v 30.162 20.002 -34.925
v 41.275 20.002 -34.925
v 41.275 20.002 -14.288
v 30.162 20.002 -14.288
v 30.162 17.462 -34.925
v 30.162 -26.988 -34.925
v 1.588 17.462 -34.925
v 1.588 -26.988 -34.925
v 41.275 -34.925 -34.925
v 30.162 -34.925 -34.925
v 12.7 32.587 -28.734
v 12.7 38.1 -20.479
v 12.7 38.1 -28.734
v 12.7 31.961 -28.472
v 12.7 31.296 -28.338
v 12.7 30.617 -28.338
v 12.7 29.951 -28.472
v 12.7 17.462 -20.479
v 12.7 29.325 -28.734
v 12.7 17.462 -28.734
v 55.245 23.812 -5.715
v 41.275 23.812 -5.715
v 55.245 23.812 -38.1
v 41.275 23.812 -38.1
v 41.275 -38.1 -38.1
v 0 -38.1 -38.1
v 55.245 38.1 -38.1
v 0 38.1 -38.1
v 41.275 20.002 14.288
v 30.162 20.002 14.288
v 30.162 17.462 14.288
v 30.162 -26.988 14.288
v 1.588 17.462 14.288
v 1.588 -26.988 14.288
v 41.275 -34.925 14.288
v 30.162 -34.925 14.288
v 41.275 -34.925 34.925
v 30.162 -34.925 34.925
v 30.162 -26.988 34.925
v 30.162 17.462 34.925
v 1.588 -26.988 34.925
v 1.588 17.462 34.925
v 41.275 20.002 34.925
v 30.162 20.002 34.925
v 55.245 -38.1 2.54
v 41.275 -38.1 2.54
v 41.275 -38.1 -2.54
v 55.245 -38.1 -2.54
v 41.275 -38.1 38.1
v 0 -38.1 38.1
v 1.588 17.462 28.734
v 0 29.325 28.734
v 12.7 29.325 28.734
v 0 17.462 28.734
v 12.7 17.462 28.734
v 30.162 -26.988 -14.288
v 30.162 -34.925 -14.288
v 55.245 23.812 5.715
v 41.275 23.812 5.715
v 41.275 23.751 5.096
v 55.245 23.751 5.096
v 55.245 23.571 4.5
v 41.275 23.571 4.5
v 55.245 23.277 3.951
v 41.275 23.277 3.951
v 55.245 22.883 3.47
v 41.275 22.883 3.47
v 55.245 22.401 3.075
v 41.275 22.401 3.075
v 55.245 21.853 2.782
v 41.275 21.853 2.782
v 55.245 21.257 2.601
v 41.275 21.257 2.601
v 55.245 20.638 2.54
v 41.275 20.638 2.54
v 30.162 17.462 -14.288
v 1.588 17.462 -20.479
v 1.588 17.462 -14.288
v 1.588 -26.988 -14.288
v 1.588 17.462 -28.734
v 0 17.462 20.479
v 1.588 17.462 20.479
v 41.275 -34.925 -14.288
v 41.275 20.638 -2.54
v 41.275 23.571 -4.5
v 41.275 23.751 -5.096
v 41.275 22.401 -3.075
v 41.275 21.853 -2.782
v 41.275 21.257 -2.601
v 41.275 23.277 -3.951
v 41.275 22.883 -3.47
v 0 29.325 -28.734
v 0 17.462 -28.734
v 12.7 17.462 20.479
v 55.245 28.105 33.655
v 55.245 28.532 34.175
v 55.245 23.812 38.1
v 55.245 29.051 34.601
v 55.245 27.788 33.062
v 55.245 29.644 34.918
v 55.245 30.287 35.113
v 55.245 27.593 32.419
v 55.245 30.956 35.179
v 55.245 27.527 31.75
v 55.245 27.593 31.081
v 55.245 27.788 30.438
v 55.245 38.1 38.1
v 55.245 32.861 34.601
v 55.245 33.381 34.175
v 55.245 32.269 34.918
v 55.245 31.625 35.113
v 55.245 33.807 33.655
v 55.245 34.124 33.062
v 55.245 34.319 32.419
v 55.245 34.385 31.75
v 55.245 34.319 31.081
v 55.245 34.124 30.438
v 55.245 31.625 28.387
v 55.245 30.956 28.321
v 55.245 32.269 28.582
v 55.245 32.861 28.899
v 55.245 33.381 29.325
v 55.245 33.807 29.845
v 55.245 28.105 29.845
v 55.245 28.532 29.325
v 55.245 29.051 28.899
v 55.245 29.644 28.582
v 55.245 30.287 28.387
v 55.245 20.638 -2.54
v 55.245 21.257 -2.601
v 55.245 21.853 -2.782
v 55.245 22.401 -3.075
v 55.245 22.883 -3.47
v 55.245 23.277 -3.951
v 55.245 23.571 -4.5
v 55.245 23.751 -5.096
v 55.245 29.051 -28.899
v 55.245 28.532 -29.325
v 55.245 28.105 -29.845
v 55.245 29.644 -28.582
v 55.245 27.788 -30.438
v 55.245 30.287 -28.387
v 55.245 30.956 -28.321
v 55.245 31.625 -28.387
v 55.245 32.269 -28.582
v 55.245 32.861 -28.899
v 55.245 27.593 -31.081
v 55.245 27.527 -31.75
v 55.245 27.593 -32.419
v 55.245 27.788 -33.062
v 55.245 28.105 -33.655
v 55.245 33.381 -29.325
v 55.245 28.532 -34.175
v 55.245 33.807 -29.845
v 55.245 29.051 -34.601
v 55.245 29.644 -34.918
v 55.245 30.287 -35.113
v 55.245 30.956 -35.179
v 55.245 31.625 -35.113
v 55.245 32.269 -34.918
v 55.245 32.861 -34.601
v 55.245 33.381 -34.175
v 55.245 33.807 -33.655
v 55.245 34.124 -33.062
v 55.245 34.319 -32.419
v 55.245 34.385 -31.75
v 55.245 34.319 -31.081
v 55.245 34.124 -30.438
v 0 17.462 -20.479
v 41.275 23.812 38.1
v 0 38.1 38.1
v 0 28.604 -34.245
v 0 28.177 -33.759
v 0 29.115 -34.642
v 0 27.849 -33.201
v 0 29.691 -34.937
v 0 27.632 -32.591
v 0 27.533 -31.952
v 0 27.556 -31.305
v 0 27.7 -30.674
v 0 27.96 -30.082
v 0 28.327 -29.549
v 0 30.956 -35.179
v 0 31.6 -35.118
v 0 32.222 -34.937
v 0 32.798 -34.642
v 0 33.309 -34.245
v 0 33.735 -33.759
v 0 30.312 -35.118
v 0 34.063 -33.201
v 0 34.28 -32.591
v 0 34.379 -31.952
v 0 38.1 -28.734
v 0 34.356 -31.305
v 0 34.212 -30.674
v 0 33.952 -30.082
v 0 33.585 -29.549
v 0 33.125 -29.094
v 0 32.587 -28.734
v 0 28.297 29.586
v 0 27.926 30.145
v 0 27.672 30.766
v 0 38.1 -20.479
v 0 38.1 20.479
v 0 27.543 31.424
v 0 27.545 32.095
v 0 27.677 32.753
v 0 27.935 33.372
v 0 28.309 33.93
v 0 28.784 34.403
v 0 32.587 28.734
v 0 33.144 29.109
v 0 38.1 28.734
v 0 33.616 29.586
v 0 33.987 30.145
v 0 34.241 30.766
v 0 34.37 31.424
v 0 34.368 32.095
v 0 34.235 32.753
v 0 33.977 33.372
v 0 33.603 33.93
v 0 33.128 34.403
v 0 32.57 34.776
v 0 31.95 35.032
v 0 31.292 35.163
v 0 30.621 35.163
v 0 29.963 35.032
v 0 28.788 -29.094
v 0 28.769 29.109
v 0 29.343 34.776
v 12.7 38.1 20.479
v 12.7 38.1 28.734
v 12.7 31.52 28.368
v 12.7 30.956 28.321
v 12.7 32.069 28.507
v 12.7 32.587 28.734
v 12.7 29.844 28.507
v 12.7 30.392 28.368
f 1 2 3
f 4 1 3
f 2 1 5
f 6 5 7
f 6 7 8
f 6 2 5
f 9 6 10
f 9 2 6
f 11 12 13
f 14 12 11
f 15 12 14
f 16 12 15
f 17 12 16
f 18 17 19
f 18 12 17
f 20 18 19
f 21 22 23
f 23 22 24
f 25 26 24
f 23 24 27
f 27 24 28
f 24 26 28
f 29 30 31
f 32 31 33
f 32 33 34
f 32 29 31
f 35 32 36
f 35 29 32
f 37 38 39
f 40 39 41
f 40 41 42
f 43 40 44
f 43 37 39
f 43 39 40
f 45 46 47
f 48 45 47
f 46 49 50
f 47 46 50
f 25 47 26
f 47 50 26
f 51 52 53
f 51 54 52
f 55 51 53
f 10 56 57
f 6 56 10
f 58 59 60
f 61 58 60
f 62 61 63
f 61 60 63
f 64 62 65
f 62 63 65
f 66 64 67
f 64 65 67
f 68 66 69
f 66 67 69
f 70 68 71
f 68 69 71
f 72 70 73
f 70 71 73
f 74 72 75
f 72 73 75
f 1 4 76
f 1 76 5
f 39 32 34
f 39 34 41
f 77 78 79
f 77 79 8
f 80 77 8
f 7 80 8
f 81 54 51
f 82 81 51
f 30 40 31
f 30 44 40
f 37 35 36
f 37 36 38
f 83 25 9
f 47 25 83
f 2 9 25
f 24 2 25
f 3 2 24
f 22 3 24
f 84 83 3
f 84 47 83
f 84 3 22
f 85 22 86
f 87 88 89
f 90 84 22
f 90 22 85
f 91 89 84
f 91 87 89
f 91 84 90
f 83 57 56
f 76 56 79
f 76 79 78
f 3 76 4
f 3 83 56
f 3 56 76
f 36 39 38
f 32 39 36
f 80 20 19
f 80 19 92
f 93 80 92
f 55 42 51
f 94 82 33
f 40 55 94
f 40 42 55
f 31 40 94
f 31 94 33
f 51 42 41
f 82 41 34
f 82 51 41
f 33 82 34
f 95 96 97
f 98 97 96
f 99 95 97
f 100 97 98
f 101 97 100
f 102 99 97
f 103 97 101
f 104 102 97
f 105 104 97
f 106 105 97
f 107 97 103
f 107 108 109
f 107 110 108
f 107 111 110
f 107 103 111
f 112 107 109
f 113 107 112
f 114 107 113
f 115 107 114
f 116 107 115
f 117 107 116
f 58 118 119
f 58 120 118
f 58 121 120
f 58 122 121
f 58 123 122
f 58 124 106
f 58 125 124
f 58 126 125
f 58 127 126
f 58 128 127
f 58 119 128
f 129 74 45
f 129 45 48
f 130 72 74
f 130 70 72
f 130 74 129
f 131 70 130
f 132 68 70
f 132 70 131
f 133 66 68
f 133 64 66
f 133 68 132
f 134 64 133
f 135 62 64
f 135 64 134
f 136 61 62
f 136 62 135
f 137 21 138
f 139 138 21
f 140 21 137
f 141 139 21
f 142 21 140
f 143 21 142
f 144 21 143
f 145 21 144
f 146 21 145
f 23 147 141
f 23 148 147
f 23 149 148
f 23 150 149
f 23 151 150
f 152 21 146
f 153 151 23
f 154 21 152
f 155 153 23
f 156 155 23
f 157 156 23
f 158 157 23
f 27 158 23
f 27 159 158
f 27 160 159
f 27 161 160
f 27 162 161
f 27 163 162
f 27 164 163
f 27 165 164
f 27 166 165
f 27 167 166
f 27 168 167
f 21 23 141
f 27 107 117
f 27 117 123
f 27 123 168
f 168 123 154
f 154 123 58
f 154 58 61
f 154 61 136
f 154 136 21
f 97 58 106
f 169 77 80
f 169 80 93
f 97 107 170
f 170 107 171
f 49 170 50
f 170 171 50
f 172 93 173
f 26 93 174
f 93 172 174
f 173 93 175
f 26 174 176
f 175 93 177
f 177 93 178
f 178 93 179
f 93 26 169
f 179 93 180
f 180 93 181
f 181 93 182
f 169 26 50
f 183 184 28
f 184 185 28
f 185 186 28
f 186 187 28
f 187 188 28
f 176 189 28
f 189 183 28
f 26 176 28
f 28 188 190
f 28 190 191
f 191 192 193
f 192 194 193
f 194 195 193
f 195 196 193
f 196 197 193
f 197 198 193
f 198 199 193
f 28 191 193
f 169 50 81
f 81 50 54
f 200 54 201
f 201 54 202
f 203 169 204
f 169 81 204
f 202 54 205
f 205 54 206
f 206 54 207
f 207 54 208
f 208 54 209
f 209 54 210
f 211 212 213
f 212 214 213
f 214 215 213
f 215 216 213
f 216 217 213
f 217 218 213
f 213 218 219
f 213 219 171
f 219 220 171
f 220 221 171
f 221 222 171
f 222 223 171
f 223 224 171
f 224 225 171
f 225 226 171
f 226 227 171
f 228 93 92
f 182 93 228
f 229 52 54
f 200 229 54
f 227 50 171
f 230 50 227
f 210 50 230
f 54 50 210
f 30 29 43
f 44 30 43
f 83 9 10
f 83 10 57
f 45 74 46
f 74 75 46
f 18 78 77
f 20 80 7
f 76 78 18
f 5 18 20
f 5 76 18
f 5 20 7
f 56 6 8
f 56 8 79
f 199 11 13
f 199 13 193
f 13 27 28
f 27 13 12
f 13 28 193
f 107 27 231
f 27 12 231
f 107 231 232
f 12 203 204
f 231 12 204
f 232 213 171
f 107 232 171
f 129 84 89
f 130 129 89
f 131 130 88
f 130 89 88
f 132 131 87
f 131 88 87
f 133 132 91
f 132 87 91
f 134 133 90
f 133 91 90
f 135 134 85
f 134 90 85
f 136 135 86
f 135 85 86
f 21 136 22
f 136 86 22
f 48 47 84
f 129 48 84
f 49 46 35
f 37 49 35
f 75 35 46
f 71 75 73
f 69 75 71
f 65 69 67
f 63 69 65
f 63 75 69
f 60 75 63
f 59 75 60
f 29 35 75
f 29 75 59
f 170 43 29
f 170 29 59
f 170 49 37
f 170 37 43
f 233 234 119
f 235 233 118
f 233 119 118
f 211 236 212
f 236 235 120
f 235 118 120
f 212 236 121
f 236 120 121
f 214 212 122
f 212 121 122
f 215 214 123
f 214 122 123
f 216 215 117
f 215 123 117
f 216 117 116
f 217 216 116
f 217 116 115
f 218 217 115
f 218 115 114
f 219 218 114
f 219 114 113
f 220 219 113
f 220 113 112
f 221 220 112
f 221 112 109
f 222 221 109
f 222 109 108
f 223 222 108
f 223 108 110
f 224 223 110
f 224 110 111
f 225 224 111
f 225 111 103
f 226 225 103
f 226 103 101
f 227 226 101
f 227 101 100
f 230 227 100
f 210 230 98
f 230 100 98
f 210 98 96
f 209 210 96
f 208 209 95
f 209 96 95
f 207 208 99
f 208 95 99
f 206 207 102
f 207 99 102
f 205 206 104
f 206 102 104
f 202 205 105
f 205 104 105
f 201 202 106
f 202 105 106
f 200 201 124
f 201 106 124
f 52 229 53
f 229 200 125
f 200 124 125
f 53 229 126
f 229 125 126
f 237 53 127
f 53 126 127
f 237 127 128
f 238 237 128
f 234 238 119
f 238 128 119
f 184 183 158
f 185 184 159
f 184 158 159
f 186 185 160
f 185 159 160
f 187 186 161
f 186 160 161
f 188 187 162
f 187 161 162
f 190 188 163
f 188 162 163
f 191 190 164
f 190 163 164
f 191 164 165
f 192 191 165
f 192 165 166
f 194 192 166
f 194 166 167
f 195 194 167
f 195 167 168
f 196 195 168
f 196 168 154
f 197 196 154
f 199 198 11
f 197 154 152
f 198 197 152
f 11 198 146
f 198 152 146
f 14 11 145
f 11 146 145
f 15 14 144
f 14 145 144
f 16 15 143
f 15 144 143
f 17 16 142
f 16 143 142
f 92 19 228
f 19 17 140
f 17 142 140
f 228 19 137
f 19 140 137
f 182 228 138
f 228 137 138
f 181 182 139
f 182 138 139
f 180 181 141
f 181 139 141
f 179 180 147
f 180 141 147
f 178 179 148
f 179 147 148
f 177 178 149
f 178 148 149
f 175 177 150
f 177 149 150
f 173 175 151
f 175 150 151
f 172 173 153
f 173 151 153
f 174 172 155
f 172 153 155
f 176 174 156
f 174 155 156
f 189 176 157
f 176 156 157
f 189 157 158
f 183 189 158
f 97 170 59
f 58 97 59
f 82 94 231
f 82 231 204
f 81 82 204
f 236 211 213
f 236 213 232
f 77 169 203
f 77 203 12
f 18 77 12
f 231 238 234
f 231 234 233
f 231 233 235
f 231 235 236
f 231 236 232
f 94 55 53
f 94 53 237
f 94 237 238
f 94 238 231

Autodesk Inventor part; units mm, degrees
ref_plane "YZ Plane" through (0, 0, 0) normal (1, 0, 0) x (0, 1, 0)
ref_plane "XZ Plane" through (0, 0, 0) normal (0, 1, 0) x (-1, 0, 0)
ref_plane "XY Plane" through (0, 0, 0) normal (0, 0, 1) x (1, 0, 0)
sketch "Sketch1" plane through (0, 0, 0) normal (1, 0, 0) x (0, 1, 0)
  line L0 (38.1, 38.1) -> (-38.1, 38.1)
  line L1 (-38.1, 38.1) -> (-38.1, -38.1)
  line L2 (-38.1, -38.1) -> (38.1, -38.1)
  line L3 (38.1, -38.1) -> (38.1, 38.1)
  point P0 (0, 0)
  dimension "d0" = 76.2
  dimension "d1" = 76.2
  dimension "d2" = 38.1
  dimension "d3" = 38.1
extrude "Extrusion1" add sketch "Sketch1" along normal blind 41.275
sketch "Sketch2" plane through (41.275, 0, 0) normal (1, 0, 0) x (0, 0, -1)
  line L0 (-38.1, -38.1) -> (38.1, -38.1) projected
  line L1 (38.1, -38.1) -> (38.1, 38.1) projected
  line L2 (38.1, 38.1) -> (-38.1, 38.1) projected
  line L3 (-38.1, 38.1) -> (-38.1, -38.1) projected
  line L4 (-34.925, 17.4625) -> (-14.2875, 17.4625)
  line L5 (-14.2875, 17.4625) -> (-14.2875, -26.9875)
  line L6 (-14.2875, -26.9875) -> (-34.925, -26.9875)
  line L7 (-34.925, -26.9875) -> (-34.925, 17.4625)
  dimension "d64" = 20.6375
  dimension "d65" = 44.45
  dimension "d66" = 3.175
  dimension "d67" = 11.1125
extrude "Extrusion2" cut sketch "Sketch2" against normal blind 39.6875 contours L4 L5 L6 L7
sketch "Sketch3" plane through (41.275, 0, 0) normal (1, 0, 0) x (0, 0, -1)
  line L0 (-14.2875, 17.4625) -> (-14.2875, -26.9875) projected
  line L1 (-14.2875, -26.9875) -> (-34.925, -26.9875) projected
  line L2 (-34.925, -26.9875) -> (-34.925, 17.4625) projected
  line L3 (-34.925, 17.4625) -> (-14.2875, 17.4625) projected
  line L4 (-38.1, -38.1) -> (38.1, -38.1) projected
  line L5 (38.1, -38.1) -> (38.1, 38.1) projected
  line L6 (38.1, 38.1) -> (-38.1, 38.1) projected
  line L7 (-38.1, 38.1) -> (-38.1, -38.1) projected
  line L8 (-14.2875, -26.9875) -> (-34.925, -26.9875) projected
  line L9 (-34.925, -26.9875) -> (-14.2875, -26.9875)
  line L10 (-14.2875, -26.9875) -> (-14.2875, -34.925)
  line L11 (-14.2875, -34.925) -> (-34.925, -34.925)
  line L12 (-34.925, -34.925) -> (-34.925, -26.9875)
  line L13 (-34.925, 17.4625) -> (-14.2875, 17.4625)
  line L14 (-14.2875, 17.4625) -> (-14.2875, 20.0025)
  line L15 (-14.2875, 20.0025) -> (-34.925, 20.0025)
  line L16 (-34.925, 20.0025) -> (-34.925, 17.4625)
  dimension "d68" = 7.9375
  dimension "d69" = 20.6375
  dimension "d70" = 20.6375
  dimension "d71" = 20.6375
  dimension "d72" = 2.54
extrude "Extrusion3" cut sketch "Sketch3" against normal blind 11.1125 contours L3 L16 L15 L14 | L10 L11 L12 L1
sketch "Sketch4" plane through (15.875, 17.4625, 12.7) normal (0, -1, 0) x (1, 0, 0)
  line L0 (-15.875, -50.8) -> (-15.875, 25.4) projected
  line L1 (-15.875, 25.4) -> (25.4, 25.4) projected
  line L2 (25.4, -50.8) -> (25.4, 25.4) projected
  line L3 (-15.875, -50.8) -> (25.4, -50.8) projected
  line L4 (25.4, 22.225) -> (25.4, 1.5875) projected
  line L5 (25.4, 22.225) -> (14.2875, 22.225) projected
  line L6 (14.2875, 22.225) -> (14.2875, 1.5875) projected
  line L7 (25.4, 1.5875) -> (14.2875, 1.5875) projected
  line L8 (-15.875, 16.0338) -> (-3.175, 16.0338)
  line L9 (-3.175, 16.0338) -> (-3.175, 7.7788)
  line L10 (-3.175, 7.7788) -> (-15.875, 7.7788)
  line L11 (-15.875, 7.7788) -> (-15.875, 16.0338)
  point P0 (-3.175, 11.9063)
  dimension "d73" = 8.255
  dimension "d74" = 12.7
  dimension "d75" = 20.6375
  dimension "d76" = 10.3187
extrude "Extrusion4" cut sketch "Sketch4" against normal blind 38.1 contours L0 L8 L9 L10
mirror "Mirror1" about plane through (0, 0, 0) normal (0, 0, 1) of "Extrusion4", "Extrusion3", "Extrusion2"
sketch "Sketch5" plane through (41.275, 0, 0) normal (1, 0, 0) x (0, 0, -1)
  line L0 (-38.1, -38.1) -> (38.1, -38.1) projected
  line L1 (38.1, -38.1) -> (38.1, 38.1) projected
  line L2 (38.1, 38.1) -> (-38.1, 38.1) projected
  line L3 (-38.1, 38.1) -> (-38.1, -38.1) projected
  line L4 (-38.1, -38.1) -> (38.1, -38.1) projected
  line L5 (-2.54, -38.1) -> (2.54, -38.1)
  line L6 (2.54, -38.1) -> (2.54, 20.6375)
  line L7 (2.54, 23.8125) -> (-2.54, 23.8125)
  line L8 (-2.54, 20.6375) -> (-2.54, -38.1)
  line L9 (-38.1, 38.1) -> (-38.1, -38.1) projected
  line L10 (38.1, 38.1) -> (-38.1, 38.1)
  line L11 (-38.1, 38.1) -> (-38.1, 23.8125)
  line L12 (-38.1, 23.8125) -> (-5.715, 23.8125)
  line L13 (38.1, 23.8125) -> (38.1, 38.1)
  line L14 (5.715, 23.8125) -> (38.1, 23.8125)
  line L15 (2.54, 23.8125) -> (2.54, 23.8125)
  arc A0 (-2.54, 20.6375) -> (-5.715, 23.8125) centre (-5.715, 20.6375) ccw
  arc A1 (5.715, 23.8125) -> (2.54, 20.6375) centre (5.715, 20.6375) ccw
  line L16 (-14.2875, 20.0025) -> (-14.2875, -34.925) projected
  line L17 (-34.925, -34.925) -> (-34.925, 20.0025) projected
  line L18 (-14.2875, -34.925) -> (-34.925, -34.925) projected
  line L19 (-34.925, 20.0025) -> (-14.2875, 20.0025) projected
  point P0 (0, 0)
  point P1 (38.1, 23.8125)
  point P2 (-2.54, -38.1)
  dimension "d36" = 5.08
  dimension "d39" = 2.54
  dimension "d40" = 3.175
  dimension "d44" = 61.9125
extrude "Extrusion5" add sketch "Sketch5" along normal blind 13.97 contours L8 A0 L12 L3 L2 L1 L14 A1 L6 L0
sketch "Sketch6" plane through (0, -38.1, 38.1) normal (0, 0, 1) x (1, 0, 0)
  line L0 (-11.1125, 84.1375) -> (53.975, 84.1375)
  line L1 (53.975, 84.1375) -> (53.975, -9.525)
  line L2 (53.975, -9.525) -> (-11.1125, -9.525)
  line L3 (-11.1125, -9.525) -> (-11.1125, 84.1375)
  point P0 (0, 38.1)
extrude "Extrusion6" [suppressed]
sketch "Sketch7" plane through (3.175, 22.225, -11.2395) normal (0, 0, -1) x (-1, 0, 0)
  line L0 (3.175, 15.875) -> (3.175, -60.325) projected
  line L1 (-28.575, 0) -> (-12.7, 0) projected
  line L2 (3.175, 15.875) -> (3.175, -60.325) projected
  line L3 (3.175, -60.325) -> (-38.1, -60.325) projected
  line L4 (-38.1, 1.5875) -> (-38.1, -60.325) projected
  line L5 (-38.1, 1.5875) -> (-52.07, 1.5875) projected
  line L6 (-52.07, 15.875) -> (-52.07, 1.5875) projected
  line L7 (3.175, 15.875) -> (-52.07, 15.875) projected
  line L8 (3.175, 15.875) -> (-6.35, 15.875)
  line L9 (-6.35, 15.875) -> (-6.35, 0)
  line L10 (-6.35, 0) -> (3.175, 0)
  line L11 (3.175, 0) -> (3.175, 15.875)
  line L12 (-6.35, -1.5875) -> (-6.35, 15.875) projected
  line L13 (-6.35, 0) -> (3.175, 12.7)
  point P0 (3.175, -22.225)
  point P1 (3.175, 15.875)
  point P2 (-6.35, 15.875)
  dimension "d49" = 9.525
  dimension "d50" = 3.175
extrude "Extrusion7" [suppressed]
mirror "Mirror2" [suppressed]
sketch "Sketch8" plane through (0, 38.1, 38.1) normal (0, 1, 0) x (1, 0, 0)
  line L0 (9.525, 46.1645) -> (0, 46.1645) projected
  line L1 (0, 36.6395) -> (9.525, 36.6395) projected
  line L2 (15.875, 47.625) -> (15.875, 60.579) projected
  arc A0 (0, 36.6395) -> (0, 46.1645) centre (-0.8069, 41.402) ccw
  line L3 (0, 46.1645) -> (0, 36.6395)
  point P0 (0, 38.1)
  point P1 (3.175, 49.3395)
  point P2 (3.175, 58.8645)
  dimension "d53" = 4.8304
extrude "Extrusion8" [suppressed]
mirror "Mirror3" [suppressed]
sketch "Sketch11" plane through (55.245, 0, 0) normal (1, 0, 0) x (0, 0, -1)
  circle A0 centre (-31.75, 30.9563) radius 3.429
  circle A1 centre (31.75, 30.9563) radius 3.429
  line L0 (5.715, 23.8125) -> (38.1, 23.8125) projected
  line L1 (38.1, 23.8125) -> (38.1, 38.1) projected
  line L2 (38.1, 38.1) -> (-38.1, 38.1) projected
  line L3 (-38.1, 38.1) -> (-38.1, 23.8125) projected
  line L4 (-38.1, 23.8125) -> (-5.715, 23.8125) projected
  arc A2 (-2.54, 20.6375) -> (-5.715, 23.8125) centre (-5.715, 20.6375) ccw projected
  line L5 (-2.54, 20.6375) -> (-2.54, -38.1) projected
  line L6 (-2.54, -38.1) -> (2.54, -38.1) projected
  line L7 (2.54, -38.1) -> (2.54, 20.6375) projected
  arc A3 (5.715, 23.8125) -> (2.54, 20.6375) centre (5.715, 20.6375) ccw projected
  point P0 (0, 0)
  point P1 (0, 38.1)
  dimension "d77" = 63.5
  dimension "d78" = 76.2
  dimension "d79" = 31.75
  dimension "d80" = 14.2875
  dimension "d81" = 7.1437
  dimension "d82" = 7.1437
  dimension "d83" = 6.858
  dimension "d84" = 6.858
extrude "Extrusion10" cut sketch "Sketch11" against normal through all contours A0 | A1
equation "\"d2\" = 0.5 * d0"
equation "\"d3\" = 0.5 * d1"
equation "\"d70\" = d69"
equation "\"d71\" = d69"
equation "\"d76\" = 0.5 * d75"
equation "\"d39\" = 0.5 * d36"
equation "\"d44\" = d43"
equation "\"d79\" = 0.5 * d77"
equation "\"d81\" = 0.5 * d80"
equation "\"d82\" = d81"
equation "\"d43\" = 61.9125"
properties part number "Part_2_servobox"
